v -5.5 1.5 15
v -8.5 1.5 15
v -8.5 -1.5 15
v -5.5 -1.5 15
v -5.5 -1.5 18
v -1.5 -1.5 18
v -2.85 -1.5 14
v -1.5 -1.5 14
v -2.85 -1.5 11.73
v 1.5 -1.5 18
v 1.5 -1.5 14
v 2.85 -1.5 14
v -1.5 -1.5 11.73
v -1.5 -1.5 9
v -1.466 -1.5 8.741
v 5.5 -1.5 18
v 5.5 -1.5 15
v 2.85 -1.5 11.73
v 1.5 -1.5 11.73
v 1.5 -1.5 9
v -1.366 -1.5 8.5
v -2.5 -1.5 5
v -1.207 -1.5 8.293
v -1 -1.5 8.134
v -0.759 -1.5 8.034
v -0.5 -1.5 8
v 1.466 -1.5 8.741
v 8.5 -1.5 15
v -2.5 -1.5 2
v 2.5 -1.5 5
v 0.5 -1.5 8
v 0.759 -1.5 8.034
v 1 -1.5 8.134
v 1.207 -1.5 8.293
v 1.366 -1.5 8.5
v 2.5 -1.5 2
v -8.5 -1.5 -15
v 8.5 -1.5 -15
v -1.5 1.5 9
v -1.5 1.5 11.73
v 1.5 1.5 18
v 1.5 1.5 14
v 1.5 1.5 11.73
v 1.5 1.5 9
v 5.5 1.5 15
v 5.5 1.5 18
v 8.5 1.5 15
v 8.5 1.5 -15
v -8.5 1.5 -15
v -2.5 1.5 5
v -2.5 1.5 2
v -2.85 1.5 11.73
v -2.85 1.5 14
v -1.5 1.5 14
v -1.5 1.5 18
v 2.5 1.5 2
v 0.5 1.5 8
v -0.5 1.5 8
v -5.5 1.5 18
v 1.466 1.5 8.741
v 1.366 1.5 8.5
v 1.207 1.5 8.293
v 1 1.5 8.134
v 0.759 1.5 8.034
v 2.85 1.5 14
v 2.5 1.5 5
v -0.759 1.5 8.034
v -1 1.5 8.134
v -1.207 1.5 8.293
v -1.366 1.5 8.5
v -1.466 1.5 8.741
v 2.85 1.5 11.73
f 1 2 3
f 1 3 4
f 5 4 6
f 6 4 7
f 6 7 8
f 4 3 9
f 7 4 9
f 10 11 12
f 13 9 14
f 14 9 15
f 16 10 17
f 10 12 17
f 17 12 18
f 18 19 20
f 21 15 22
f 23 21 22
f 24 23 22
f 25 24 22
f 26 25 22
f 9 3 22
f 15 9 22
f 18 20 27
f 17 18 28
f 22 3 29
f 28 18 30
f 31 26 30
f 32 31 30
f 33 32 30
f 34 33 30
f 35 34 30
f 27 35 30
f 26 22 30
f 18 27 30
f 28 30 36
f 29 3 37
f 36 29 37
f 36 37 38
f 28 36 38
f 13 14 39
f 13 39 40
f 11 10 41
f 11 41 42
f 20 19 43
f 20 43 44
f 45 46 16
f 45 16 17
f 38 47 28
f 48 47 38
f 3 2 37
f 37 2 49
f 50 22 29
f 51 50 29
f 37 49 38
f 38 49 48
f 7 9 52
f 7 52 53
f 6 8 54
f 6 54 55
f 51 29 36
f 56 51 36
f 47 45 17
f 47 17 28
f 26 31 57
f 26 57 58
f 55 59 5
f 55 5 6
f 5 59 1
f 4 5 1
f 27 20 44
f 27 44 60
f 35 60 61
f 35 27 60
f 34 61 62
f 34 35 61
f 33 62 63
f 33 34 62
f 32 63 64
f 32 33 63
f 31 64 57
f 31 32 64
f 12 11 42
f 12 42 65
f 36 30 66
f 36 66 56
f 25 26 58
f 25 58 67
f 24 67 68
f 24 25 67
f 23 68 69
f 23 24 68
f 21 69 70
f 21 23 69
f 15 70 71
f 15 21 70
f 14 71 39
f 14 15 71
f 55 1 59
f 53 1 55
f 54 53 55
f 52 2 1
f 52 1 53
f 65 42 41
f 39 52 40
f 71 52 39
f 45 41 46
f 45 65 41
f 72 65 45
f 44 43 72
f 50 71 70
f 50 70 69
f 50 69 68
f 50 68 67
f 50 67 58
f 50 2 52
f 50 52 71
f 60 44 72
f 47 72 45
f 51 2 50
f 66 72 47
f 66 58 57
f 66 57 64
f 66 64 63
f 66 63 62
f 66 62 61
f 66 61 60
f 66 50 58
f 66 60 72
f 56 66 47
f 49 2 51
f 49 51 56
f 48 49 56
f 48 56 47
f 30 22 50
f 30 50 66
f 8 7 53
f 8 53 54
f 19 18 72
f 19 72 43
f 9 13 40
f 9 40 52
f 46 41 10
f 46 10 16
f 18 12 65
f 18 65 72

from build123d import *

# Parameters (mm, degrees)
SKETCH1_W               = 17
SKETCH1_H               = 30
BOSS_EXTRUDE1_DEPTH     = 1.5
SKETCH2_W               = 11
SKETCH2_H               = 3
BOSS_EXTRUDE2_DEPTH     = 1.5
CUT_EXTRUDE1_DEPTH      = 20.962464778
CUT_EXTRUDE1_DEPTH_BACK = 20.962464778
SKETCH3_W               = 5
SKETCH3_H               = 3
CUT_EXTRUDE2_DEPTH      = 20.962464778
CUT_EXTRUDE2_DEPTH_BACK = 20.962464778


with BuildPart() as part:
    # Sketch1 → Boss-Extrude1 (new, symmetric)
    with BuildSketch(Plane(origin=(0, 0, 0), x_dir=(1, 0, 0), z_dir=(0, 1, 0))):
        Rectangle(SKETCH1_W, SKETCH1_H)
    extrude(amount=BOSS_EXTRUDE1_DEPTH, both=True)

    # Sketch2 → Boss-Extrude2 (add, symmetric)
    with BuildSketch(Plane(origin=(0, 0, 0), x_dir=(1, 0, 0), z_dir=(0, 1, 0))):
        with Locations((0, -16.5)):
            Rectangle(SKETCH2_W, SKETCH2_H)
    extrude(amount=BOSS_EXTRUDE2_DEPTH, both=True)

    # Sketch3 → Cut-Extrude1 (cut, two sides: drawn at the far end of the back side and taken through both)
    with BuildSketch(Plane(origin=(0, 0, 0), x_dir=(1, 0, 0), z_dir=(0, 1, 0)).offset(-CUT_EXTRUDE1_DEPTH_BACK)):
        with Locations((0, -3.5)):
            Rectangle(SKETCH3_W, SKETCH3_H)
    extrude(amount=CUT_EXTRUDE1_DEPTH + CUT_EXTRUDE1_DEPTH_BACK, mode=Mode.SUBTRACT)

    # Sketch4 → Cut-Extrude2 (cut, two sides: drawn at the far end of the back side and taken through both)
    with BuildSketch(Plane(origin=(0, 0, 0), x_dir=(1, 0, 0), z_dir=(0, 1, 0)).offset(-CUT_EXTRUDE2_DEPTH_BACK)):
        with BuildLine():
            Line((-1.5, -18), (1.5, -18))
            Line((1.5, -18), (1.5, -14))
            Line((1.5, -14), (2.85, -14))
            Line((2.85, -14), (2.85, -11.73))
            Line((2.85, -11.73), (1.5, -11.73))
            Line((1.5, -11.73), (1.5, -9))
            ThreePointArc((1.5, -9), (1.207106781, -8.292893219), (0.5, -8))
            Line((0.5, -8), (-0.5, -8))
            ThreePointArc((-0.5, -8), (-1.207106781, -8.292893219), (-1.5, -9))
            Line((-1.5, -9), (-1.5, -11.73))
            Line((-1.5, -11.73), (-2.85, -11.73))
            Line((-2.85, -11.73), (-2.85, -14))
            Line((-2.85, -14), (-1.5, -14))
            Line((-1.5, -14), (-1.5, -18))
        make_face()
    extrude(amount=CUT_EXTRUDE2_DEPTH + CUT_EXTRUDE2_DEPTH_BACK, mode=Mode.SUBTRACT)


solid = part.part
